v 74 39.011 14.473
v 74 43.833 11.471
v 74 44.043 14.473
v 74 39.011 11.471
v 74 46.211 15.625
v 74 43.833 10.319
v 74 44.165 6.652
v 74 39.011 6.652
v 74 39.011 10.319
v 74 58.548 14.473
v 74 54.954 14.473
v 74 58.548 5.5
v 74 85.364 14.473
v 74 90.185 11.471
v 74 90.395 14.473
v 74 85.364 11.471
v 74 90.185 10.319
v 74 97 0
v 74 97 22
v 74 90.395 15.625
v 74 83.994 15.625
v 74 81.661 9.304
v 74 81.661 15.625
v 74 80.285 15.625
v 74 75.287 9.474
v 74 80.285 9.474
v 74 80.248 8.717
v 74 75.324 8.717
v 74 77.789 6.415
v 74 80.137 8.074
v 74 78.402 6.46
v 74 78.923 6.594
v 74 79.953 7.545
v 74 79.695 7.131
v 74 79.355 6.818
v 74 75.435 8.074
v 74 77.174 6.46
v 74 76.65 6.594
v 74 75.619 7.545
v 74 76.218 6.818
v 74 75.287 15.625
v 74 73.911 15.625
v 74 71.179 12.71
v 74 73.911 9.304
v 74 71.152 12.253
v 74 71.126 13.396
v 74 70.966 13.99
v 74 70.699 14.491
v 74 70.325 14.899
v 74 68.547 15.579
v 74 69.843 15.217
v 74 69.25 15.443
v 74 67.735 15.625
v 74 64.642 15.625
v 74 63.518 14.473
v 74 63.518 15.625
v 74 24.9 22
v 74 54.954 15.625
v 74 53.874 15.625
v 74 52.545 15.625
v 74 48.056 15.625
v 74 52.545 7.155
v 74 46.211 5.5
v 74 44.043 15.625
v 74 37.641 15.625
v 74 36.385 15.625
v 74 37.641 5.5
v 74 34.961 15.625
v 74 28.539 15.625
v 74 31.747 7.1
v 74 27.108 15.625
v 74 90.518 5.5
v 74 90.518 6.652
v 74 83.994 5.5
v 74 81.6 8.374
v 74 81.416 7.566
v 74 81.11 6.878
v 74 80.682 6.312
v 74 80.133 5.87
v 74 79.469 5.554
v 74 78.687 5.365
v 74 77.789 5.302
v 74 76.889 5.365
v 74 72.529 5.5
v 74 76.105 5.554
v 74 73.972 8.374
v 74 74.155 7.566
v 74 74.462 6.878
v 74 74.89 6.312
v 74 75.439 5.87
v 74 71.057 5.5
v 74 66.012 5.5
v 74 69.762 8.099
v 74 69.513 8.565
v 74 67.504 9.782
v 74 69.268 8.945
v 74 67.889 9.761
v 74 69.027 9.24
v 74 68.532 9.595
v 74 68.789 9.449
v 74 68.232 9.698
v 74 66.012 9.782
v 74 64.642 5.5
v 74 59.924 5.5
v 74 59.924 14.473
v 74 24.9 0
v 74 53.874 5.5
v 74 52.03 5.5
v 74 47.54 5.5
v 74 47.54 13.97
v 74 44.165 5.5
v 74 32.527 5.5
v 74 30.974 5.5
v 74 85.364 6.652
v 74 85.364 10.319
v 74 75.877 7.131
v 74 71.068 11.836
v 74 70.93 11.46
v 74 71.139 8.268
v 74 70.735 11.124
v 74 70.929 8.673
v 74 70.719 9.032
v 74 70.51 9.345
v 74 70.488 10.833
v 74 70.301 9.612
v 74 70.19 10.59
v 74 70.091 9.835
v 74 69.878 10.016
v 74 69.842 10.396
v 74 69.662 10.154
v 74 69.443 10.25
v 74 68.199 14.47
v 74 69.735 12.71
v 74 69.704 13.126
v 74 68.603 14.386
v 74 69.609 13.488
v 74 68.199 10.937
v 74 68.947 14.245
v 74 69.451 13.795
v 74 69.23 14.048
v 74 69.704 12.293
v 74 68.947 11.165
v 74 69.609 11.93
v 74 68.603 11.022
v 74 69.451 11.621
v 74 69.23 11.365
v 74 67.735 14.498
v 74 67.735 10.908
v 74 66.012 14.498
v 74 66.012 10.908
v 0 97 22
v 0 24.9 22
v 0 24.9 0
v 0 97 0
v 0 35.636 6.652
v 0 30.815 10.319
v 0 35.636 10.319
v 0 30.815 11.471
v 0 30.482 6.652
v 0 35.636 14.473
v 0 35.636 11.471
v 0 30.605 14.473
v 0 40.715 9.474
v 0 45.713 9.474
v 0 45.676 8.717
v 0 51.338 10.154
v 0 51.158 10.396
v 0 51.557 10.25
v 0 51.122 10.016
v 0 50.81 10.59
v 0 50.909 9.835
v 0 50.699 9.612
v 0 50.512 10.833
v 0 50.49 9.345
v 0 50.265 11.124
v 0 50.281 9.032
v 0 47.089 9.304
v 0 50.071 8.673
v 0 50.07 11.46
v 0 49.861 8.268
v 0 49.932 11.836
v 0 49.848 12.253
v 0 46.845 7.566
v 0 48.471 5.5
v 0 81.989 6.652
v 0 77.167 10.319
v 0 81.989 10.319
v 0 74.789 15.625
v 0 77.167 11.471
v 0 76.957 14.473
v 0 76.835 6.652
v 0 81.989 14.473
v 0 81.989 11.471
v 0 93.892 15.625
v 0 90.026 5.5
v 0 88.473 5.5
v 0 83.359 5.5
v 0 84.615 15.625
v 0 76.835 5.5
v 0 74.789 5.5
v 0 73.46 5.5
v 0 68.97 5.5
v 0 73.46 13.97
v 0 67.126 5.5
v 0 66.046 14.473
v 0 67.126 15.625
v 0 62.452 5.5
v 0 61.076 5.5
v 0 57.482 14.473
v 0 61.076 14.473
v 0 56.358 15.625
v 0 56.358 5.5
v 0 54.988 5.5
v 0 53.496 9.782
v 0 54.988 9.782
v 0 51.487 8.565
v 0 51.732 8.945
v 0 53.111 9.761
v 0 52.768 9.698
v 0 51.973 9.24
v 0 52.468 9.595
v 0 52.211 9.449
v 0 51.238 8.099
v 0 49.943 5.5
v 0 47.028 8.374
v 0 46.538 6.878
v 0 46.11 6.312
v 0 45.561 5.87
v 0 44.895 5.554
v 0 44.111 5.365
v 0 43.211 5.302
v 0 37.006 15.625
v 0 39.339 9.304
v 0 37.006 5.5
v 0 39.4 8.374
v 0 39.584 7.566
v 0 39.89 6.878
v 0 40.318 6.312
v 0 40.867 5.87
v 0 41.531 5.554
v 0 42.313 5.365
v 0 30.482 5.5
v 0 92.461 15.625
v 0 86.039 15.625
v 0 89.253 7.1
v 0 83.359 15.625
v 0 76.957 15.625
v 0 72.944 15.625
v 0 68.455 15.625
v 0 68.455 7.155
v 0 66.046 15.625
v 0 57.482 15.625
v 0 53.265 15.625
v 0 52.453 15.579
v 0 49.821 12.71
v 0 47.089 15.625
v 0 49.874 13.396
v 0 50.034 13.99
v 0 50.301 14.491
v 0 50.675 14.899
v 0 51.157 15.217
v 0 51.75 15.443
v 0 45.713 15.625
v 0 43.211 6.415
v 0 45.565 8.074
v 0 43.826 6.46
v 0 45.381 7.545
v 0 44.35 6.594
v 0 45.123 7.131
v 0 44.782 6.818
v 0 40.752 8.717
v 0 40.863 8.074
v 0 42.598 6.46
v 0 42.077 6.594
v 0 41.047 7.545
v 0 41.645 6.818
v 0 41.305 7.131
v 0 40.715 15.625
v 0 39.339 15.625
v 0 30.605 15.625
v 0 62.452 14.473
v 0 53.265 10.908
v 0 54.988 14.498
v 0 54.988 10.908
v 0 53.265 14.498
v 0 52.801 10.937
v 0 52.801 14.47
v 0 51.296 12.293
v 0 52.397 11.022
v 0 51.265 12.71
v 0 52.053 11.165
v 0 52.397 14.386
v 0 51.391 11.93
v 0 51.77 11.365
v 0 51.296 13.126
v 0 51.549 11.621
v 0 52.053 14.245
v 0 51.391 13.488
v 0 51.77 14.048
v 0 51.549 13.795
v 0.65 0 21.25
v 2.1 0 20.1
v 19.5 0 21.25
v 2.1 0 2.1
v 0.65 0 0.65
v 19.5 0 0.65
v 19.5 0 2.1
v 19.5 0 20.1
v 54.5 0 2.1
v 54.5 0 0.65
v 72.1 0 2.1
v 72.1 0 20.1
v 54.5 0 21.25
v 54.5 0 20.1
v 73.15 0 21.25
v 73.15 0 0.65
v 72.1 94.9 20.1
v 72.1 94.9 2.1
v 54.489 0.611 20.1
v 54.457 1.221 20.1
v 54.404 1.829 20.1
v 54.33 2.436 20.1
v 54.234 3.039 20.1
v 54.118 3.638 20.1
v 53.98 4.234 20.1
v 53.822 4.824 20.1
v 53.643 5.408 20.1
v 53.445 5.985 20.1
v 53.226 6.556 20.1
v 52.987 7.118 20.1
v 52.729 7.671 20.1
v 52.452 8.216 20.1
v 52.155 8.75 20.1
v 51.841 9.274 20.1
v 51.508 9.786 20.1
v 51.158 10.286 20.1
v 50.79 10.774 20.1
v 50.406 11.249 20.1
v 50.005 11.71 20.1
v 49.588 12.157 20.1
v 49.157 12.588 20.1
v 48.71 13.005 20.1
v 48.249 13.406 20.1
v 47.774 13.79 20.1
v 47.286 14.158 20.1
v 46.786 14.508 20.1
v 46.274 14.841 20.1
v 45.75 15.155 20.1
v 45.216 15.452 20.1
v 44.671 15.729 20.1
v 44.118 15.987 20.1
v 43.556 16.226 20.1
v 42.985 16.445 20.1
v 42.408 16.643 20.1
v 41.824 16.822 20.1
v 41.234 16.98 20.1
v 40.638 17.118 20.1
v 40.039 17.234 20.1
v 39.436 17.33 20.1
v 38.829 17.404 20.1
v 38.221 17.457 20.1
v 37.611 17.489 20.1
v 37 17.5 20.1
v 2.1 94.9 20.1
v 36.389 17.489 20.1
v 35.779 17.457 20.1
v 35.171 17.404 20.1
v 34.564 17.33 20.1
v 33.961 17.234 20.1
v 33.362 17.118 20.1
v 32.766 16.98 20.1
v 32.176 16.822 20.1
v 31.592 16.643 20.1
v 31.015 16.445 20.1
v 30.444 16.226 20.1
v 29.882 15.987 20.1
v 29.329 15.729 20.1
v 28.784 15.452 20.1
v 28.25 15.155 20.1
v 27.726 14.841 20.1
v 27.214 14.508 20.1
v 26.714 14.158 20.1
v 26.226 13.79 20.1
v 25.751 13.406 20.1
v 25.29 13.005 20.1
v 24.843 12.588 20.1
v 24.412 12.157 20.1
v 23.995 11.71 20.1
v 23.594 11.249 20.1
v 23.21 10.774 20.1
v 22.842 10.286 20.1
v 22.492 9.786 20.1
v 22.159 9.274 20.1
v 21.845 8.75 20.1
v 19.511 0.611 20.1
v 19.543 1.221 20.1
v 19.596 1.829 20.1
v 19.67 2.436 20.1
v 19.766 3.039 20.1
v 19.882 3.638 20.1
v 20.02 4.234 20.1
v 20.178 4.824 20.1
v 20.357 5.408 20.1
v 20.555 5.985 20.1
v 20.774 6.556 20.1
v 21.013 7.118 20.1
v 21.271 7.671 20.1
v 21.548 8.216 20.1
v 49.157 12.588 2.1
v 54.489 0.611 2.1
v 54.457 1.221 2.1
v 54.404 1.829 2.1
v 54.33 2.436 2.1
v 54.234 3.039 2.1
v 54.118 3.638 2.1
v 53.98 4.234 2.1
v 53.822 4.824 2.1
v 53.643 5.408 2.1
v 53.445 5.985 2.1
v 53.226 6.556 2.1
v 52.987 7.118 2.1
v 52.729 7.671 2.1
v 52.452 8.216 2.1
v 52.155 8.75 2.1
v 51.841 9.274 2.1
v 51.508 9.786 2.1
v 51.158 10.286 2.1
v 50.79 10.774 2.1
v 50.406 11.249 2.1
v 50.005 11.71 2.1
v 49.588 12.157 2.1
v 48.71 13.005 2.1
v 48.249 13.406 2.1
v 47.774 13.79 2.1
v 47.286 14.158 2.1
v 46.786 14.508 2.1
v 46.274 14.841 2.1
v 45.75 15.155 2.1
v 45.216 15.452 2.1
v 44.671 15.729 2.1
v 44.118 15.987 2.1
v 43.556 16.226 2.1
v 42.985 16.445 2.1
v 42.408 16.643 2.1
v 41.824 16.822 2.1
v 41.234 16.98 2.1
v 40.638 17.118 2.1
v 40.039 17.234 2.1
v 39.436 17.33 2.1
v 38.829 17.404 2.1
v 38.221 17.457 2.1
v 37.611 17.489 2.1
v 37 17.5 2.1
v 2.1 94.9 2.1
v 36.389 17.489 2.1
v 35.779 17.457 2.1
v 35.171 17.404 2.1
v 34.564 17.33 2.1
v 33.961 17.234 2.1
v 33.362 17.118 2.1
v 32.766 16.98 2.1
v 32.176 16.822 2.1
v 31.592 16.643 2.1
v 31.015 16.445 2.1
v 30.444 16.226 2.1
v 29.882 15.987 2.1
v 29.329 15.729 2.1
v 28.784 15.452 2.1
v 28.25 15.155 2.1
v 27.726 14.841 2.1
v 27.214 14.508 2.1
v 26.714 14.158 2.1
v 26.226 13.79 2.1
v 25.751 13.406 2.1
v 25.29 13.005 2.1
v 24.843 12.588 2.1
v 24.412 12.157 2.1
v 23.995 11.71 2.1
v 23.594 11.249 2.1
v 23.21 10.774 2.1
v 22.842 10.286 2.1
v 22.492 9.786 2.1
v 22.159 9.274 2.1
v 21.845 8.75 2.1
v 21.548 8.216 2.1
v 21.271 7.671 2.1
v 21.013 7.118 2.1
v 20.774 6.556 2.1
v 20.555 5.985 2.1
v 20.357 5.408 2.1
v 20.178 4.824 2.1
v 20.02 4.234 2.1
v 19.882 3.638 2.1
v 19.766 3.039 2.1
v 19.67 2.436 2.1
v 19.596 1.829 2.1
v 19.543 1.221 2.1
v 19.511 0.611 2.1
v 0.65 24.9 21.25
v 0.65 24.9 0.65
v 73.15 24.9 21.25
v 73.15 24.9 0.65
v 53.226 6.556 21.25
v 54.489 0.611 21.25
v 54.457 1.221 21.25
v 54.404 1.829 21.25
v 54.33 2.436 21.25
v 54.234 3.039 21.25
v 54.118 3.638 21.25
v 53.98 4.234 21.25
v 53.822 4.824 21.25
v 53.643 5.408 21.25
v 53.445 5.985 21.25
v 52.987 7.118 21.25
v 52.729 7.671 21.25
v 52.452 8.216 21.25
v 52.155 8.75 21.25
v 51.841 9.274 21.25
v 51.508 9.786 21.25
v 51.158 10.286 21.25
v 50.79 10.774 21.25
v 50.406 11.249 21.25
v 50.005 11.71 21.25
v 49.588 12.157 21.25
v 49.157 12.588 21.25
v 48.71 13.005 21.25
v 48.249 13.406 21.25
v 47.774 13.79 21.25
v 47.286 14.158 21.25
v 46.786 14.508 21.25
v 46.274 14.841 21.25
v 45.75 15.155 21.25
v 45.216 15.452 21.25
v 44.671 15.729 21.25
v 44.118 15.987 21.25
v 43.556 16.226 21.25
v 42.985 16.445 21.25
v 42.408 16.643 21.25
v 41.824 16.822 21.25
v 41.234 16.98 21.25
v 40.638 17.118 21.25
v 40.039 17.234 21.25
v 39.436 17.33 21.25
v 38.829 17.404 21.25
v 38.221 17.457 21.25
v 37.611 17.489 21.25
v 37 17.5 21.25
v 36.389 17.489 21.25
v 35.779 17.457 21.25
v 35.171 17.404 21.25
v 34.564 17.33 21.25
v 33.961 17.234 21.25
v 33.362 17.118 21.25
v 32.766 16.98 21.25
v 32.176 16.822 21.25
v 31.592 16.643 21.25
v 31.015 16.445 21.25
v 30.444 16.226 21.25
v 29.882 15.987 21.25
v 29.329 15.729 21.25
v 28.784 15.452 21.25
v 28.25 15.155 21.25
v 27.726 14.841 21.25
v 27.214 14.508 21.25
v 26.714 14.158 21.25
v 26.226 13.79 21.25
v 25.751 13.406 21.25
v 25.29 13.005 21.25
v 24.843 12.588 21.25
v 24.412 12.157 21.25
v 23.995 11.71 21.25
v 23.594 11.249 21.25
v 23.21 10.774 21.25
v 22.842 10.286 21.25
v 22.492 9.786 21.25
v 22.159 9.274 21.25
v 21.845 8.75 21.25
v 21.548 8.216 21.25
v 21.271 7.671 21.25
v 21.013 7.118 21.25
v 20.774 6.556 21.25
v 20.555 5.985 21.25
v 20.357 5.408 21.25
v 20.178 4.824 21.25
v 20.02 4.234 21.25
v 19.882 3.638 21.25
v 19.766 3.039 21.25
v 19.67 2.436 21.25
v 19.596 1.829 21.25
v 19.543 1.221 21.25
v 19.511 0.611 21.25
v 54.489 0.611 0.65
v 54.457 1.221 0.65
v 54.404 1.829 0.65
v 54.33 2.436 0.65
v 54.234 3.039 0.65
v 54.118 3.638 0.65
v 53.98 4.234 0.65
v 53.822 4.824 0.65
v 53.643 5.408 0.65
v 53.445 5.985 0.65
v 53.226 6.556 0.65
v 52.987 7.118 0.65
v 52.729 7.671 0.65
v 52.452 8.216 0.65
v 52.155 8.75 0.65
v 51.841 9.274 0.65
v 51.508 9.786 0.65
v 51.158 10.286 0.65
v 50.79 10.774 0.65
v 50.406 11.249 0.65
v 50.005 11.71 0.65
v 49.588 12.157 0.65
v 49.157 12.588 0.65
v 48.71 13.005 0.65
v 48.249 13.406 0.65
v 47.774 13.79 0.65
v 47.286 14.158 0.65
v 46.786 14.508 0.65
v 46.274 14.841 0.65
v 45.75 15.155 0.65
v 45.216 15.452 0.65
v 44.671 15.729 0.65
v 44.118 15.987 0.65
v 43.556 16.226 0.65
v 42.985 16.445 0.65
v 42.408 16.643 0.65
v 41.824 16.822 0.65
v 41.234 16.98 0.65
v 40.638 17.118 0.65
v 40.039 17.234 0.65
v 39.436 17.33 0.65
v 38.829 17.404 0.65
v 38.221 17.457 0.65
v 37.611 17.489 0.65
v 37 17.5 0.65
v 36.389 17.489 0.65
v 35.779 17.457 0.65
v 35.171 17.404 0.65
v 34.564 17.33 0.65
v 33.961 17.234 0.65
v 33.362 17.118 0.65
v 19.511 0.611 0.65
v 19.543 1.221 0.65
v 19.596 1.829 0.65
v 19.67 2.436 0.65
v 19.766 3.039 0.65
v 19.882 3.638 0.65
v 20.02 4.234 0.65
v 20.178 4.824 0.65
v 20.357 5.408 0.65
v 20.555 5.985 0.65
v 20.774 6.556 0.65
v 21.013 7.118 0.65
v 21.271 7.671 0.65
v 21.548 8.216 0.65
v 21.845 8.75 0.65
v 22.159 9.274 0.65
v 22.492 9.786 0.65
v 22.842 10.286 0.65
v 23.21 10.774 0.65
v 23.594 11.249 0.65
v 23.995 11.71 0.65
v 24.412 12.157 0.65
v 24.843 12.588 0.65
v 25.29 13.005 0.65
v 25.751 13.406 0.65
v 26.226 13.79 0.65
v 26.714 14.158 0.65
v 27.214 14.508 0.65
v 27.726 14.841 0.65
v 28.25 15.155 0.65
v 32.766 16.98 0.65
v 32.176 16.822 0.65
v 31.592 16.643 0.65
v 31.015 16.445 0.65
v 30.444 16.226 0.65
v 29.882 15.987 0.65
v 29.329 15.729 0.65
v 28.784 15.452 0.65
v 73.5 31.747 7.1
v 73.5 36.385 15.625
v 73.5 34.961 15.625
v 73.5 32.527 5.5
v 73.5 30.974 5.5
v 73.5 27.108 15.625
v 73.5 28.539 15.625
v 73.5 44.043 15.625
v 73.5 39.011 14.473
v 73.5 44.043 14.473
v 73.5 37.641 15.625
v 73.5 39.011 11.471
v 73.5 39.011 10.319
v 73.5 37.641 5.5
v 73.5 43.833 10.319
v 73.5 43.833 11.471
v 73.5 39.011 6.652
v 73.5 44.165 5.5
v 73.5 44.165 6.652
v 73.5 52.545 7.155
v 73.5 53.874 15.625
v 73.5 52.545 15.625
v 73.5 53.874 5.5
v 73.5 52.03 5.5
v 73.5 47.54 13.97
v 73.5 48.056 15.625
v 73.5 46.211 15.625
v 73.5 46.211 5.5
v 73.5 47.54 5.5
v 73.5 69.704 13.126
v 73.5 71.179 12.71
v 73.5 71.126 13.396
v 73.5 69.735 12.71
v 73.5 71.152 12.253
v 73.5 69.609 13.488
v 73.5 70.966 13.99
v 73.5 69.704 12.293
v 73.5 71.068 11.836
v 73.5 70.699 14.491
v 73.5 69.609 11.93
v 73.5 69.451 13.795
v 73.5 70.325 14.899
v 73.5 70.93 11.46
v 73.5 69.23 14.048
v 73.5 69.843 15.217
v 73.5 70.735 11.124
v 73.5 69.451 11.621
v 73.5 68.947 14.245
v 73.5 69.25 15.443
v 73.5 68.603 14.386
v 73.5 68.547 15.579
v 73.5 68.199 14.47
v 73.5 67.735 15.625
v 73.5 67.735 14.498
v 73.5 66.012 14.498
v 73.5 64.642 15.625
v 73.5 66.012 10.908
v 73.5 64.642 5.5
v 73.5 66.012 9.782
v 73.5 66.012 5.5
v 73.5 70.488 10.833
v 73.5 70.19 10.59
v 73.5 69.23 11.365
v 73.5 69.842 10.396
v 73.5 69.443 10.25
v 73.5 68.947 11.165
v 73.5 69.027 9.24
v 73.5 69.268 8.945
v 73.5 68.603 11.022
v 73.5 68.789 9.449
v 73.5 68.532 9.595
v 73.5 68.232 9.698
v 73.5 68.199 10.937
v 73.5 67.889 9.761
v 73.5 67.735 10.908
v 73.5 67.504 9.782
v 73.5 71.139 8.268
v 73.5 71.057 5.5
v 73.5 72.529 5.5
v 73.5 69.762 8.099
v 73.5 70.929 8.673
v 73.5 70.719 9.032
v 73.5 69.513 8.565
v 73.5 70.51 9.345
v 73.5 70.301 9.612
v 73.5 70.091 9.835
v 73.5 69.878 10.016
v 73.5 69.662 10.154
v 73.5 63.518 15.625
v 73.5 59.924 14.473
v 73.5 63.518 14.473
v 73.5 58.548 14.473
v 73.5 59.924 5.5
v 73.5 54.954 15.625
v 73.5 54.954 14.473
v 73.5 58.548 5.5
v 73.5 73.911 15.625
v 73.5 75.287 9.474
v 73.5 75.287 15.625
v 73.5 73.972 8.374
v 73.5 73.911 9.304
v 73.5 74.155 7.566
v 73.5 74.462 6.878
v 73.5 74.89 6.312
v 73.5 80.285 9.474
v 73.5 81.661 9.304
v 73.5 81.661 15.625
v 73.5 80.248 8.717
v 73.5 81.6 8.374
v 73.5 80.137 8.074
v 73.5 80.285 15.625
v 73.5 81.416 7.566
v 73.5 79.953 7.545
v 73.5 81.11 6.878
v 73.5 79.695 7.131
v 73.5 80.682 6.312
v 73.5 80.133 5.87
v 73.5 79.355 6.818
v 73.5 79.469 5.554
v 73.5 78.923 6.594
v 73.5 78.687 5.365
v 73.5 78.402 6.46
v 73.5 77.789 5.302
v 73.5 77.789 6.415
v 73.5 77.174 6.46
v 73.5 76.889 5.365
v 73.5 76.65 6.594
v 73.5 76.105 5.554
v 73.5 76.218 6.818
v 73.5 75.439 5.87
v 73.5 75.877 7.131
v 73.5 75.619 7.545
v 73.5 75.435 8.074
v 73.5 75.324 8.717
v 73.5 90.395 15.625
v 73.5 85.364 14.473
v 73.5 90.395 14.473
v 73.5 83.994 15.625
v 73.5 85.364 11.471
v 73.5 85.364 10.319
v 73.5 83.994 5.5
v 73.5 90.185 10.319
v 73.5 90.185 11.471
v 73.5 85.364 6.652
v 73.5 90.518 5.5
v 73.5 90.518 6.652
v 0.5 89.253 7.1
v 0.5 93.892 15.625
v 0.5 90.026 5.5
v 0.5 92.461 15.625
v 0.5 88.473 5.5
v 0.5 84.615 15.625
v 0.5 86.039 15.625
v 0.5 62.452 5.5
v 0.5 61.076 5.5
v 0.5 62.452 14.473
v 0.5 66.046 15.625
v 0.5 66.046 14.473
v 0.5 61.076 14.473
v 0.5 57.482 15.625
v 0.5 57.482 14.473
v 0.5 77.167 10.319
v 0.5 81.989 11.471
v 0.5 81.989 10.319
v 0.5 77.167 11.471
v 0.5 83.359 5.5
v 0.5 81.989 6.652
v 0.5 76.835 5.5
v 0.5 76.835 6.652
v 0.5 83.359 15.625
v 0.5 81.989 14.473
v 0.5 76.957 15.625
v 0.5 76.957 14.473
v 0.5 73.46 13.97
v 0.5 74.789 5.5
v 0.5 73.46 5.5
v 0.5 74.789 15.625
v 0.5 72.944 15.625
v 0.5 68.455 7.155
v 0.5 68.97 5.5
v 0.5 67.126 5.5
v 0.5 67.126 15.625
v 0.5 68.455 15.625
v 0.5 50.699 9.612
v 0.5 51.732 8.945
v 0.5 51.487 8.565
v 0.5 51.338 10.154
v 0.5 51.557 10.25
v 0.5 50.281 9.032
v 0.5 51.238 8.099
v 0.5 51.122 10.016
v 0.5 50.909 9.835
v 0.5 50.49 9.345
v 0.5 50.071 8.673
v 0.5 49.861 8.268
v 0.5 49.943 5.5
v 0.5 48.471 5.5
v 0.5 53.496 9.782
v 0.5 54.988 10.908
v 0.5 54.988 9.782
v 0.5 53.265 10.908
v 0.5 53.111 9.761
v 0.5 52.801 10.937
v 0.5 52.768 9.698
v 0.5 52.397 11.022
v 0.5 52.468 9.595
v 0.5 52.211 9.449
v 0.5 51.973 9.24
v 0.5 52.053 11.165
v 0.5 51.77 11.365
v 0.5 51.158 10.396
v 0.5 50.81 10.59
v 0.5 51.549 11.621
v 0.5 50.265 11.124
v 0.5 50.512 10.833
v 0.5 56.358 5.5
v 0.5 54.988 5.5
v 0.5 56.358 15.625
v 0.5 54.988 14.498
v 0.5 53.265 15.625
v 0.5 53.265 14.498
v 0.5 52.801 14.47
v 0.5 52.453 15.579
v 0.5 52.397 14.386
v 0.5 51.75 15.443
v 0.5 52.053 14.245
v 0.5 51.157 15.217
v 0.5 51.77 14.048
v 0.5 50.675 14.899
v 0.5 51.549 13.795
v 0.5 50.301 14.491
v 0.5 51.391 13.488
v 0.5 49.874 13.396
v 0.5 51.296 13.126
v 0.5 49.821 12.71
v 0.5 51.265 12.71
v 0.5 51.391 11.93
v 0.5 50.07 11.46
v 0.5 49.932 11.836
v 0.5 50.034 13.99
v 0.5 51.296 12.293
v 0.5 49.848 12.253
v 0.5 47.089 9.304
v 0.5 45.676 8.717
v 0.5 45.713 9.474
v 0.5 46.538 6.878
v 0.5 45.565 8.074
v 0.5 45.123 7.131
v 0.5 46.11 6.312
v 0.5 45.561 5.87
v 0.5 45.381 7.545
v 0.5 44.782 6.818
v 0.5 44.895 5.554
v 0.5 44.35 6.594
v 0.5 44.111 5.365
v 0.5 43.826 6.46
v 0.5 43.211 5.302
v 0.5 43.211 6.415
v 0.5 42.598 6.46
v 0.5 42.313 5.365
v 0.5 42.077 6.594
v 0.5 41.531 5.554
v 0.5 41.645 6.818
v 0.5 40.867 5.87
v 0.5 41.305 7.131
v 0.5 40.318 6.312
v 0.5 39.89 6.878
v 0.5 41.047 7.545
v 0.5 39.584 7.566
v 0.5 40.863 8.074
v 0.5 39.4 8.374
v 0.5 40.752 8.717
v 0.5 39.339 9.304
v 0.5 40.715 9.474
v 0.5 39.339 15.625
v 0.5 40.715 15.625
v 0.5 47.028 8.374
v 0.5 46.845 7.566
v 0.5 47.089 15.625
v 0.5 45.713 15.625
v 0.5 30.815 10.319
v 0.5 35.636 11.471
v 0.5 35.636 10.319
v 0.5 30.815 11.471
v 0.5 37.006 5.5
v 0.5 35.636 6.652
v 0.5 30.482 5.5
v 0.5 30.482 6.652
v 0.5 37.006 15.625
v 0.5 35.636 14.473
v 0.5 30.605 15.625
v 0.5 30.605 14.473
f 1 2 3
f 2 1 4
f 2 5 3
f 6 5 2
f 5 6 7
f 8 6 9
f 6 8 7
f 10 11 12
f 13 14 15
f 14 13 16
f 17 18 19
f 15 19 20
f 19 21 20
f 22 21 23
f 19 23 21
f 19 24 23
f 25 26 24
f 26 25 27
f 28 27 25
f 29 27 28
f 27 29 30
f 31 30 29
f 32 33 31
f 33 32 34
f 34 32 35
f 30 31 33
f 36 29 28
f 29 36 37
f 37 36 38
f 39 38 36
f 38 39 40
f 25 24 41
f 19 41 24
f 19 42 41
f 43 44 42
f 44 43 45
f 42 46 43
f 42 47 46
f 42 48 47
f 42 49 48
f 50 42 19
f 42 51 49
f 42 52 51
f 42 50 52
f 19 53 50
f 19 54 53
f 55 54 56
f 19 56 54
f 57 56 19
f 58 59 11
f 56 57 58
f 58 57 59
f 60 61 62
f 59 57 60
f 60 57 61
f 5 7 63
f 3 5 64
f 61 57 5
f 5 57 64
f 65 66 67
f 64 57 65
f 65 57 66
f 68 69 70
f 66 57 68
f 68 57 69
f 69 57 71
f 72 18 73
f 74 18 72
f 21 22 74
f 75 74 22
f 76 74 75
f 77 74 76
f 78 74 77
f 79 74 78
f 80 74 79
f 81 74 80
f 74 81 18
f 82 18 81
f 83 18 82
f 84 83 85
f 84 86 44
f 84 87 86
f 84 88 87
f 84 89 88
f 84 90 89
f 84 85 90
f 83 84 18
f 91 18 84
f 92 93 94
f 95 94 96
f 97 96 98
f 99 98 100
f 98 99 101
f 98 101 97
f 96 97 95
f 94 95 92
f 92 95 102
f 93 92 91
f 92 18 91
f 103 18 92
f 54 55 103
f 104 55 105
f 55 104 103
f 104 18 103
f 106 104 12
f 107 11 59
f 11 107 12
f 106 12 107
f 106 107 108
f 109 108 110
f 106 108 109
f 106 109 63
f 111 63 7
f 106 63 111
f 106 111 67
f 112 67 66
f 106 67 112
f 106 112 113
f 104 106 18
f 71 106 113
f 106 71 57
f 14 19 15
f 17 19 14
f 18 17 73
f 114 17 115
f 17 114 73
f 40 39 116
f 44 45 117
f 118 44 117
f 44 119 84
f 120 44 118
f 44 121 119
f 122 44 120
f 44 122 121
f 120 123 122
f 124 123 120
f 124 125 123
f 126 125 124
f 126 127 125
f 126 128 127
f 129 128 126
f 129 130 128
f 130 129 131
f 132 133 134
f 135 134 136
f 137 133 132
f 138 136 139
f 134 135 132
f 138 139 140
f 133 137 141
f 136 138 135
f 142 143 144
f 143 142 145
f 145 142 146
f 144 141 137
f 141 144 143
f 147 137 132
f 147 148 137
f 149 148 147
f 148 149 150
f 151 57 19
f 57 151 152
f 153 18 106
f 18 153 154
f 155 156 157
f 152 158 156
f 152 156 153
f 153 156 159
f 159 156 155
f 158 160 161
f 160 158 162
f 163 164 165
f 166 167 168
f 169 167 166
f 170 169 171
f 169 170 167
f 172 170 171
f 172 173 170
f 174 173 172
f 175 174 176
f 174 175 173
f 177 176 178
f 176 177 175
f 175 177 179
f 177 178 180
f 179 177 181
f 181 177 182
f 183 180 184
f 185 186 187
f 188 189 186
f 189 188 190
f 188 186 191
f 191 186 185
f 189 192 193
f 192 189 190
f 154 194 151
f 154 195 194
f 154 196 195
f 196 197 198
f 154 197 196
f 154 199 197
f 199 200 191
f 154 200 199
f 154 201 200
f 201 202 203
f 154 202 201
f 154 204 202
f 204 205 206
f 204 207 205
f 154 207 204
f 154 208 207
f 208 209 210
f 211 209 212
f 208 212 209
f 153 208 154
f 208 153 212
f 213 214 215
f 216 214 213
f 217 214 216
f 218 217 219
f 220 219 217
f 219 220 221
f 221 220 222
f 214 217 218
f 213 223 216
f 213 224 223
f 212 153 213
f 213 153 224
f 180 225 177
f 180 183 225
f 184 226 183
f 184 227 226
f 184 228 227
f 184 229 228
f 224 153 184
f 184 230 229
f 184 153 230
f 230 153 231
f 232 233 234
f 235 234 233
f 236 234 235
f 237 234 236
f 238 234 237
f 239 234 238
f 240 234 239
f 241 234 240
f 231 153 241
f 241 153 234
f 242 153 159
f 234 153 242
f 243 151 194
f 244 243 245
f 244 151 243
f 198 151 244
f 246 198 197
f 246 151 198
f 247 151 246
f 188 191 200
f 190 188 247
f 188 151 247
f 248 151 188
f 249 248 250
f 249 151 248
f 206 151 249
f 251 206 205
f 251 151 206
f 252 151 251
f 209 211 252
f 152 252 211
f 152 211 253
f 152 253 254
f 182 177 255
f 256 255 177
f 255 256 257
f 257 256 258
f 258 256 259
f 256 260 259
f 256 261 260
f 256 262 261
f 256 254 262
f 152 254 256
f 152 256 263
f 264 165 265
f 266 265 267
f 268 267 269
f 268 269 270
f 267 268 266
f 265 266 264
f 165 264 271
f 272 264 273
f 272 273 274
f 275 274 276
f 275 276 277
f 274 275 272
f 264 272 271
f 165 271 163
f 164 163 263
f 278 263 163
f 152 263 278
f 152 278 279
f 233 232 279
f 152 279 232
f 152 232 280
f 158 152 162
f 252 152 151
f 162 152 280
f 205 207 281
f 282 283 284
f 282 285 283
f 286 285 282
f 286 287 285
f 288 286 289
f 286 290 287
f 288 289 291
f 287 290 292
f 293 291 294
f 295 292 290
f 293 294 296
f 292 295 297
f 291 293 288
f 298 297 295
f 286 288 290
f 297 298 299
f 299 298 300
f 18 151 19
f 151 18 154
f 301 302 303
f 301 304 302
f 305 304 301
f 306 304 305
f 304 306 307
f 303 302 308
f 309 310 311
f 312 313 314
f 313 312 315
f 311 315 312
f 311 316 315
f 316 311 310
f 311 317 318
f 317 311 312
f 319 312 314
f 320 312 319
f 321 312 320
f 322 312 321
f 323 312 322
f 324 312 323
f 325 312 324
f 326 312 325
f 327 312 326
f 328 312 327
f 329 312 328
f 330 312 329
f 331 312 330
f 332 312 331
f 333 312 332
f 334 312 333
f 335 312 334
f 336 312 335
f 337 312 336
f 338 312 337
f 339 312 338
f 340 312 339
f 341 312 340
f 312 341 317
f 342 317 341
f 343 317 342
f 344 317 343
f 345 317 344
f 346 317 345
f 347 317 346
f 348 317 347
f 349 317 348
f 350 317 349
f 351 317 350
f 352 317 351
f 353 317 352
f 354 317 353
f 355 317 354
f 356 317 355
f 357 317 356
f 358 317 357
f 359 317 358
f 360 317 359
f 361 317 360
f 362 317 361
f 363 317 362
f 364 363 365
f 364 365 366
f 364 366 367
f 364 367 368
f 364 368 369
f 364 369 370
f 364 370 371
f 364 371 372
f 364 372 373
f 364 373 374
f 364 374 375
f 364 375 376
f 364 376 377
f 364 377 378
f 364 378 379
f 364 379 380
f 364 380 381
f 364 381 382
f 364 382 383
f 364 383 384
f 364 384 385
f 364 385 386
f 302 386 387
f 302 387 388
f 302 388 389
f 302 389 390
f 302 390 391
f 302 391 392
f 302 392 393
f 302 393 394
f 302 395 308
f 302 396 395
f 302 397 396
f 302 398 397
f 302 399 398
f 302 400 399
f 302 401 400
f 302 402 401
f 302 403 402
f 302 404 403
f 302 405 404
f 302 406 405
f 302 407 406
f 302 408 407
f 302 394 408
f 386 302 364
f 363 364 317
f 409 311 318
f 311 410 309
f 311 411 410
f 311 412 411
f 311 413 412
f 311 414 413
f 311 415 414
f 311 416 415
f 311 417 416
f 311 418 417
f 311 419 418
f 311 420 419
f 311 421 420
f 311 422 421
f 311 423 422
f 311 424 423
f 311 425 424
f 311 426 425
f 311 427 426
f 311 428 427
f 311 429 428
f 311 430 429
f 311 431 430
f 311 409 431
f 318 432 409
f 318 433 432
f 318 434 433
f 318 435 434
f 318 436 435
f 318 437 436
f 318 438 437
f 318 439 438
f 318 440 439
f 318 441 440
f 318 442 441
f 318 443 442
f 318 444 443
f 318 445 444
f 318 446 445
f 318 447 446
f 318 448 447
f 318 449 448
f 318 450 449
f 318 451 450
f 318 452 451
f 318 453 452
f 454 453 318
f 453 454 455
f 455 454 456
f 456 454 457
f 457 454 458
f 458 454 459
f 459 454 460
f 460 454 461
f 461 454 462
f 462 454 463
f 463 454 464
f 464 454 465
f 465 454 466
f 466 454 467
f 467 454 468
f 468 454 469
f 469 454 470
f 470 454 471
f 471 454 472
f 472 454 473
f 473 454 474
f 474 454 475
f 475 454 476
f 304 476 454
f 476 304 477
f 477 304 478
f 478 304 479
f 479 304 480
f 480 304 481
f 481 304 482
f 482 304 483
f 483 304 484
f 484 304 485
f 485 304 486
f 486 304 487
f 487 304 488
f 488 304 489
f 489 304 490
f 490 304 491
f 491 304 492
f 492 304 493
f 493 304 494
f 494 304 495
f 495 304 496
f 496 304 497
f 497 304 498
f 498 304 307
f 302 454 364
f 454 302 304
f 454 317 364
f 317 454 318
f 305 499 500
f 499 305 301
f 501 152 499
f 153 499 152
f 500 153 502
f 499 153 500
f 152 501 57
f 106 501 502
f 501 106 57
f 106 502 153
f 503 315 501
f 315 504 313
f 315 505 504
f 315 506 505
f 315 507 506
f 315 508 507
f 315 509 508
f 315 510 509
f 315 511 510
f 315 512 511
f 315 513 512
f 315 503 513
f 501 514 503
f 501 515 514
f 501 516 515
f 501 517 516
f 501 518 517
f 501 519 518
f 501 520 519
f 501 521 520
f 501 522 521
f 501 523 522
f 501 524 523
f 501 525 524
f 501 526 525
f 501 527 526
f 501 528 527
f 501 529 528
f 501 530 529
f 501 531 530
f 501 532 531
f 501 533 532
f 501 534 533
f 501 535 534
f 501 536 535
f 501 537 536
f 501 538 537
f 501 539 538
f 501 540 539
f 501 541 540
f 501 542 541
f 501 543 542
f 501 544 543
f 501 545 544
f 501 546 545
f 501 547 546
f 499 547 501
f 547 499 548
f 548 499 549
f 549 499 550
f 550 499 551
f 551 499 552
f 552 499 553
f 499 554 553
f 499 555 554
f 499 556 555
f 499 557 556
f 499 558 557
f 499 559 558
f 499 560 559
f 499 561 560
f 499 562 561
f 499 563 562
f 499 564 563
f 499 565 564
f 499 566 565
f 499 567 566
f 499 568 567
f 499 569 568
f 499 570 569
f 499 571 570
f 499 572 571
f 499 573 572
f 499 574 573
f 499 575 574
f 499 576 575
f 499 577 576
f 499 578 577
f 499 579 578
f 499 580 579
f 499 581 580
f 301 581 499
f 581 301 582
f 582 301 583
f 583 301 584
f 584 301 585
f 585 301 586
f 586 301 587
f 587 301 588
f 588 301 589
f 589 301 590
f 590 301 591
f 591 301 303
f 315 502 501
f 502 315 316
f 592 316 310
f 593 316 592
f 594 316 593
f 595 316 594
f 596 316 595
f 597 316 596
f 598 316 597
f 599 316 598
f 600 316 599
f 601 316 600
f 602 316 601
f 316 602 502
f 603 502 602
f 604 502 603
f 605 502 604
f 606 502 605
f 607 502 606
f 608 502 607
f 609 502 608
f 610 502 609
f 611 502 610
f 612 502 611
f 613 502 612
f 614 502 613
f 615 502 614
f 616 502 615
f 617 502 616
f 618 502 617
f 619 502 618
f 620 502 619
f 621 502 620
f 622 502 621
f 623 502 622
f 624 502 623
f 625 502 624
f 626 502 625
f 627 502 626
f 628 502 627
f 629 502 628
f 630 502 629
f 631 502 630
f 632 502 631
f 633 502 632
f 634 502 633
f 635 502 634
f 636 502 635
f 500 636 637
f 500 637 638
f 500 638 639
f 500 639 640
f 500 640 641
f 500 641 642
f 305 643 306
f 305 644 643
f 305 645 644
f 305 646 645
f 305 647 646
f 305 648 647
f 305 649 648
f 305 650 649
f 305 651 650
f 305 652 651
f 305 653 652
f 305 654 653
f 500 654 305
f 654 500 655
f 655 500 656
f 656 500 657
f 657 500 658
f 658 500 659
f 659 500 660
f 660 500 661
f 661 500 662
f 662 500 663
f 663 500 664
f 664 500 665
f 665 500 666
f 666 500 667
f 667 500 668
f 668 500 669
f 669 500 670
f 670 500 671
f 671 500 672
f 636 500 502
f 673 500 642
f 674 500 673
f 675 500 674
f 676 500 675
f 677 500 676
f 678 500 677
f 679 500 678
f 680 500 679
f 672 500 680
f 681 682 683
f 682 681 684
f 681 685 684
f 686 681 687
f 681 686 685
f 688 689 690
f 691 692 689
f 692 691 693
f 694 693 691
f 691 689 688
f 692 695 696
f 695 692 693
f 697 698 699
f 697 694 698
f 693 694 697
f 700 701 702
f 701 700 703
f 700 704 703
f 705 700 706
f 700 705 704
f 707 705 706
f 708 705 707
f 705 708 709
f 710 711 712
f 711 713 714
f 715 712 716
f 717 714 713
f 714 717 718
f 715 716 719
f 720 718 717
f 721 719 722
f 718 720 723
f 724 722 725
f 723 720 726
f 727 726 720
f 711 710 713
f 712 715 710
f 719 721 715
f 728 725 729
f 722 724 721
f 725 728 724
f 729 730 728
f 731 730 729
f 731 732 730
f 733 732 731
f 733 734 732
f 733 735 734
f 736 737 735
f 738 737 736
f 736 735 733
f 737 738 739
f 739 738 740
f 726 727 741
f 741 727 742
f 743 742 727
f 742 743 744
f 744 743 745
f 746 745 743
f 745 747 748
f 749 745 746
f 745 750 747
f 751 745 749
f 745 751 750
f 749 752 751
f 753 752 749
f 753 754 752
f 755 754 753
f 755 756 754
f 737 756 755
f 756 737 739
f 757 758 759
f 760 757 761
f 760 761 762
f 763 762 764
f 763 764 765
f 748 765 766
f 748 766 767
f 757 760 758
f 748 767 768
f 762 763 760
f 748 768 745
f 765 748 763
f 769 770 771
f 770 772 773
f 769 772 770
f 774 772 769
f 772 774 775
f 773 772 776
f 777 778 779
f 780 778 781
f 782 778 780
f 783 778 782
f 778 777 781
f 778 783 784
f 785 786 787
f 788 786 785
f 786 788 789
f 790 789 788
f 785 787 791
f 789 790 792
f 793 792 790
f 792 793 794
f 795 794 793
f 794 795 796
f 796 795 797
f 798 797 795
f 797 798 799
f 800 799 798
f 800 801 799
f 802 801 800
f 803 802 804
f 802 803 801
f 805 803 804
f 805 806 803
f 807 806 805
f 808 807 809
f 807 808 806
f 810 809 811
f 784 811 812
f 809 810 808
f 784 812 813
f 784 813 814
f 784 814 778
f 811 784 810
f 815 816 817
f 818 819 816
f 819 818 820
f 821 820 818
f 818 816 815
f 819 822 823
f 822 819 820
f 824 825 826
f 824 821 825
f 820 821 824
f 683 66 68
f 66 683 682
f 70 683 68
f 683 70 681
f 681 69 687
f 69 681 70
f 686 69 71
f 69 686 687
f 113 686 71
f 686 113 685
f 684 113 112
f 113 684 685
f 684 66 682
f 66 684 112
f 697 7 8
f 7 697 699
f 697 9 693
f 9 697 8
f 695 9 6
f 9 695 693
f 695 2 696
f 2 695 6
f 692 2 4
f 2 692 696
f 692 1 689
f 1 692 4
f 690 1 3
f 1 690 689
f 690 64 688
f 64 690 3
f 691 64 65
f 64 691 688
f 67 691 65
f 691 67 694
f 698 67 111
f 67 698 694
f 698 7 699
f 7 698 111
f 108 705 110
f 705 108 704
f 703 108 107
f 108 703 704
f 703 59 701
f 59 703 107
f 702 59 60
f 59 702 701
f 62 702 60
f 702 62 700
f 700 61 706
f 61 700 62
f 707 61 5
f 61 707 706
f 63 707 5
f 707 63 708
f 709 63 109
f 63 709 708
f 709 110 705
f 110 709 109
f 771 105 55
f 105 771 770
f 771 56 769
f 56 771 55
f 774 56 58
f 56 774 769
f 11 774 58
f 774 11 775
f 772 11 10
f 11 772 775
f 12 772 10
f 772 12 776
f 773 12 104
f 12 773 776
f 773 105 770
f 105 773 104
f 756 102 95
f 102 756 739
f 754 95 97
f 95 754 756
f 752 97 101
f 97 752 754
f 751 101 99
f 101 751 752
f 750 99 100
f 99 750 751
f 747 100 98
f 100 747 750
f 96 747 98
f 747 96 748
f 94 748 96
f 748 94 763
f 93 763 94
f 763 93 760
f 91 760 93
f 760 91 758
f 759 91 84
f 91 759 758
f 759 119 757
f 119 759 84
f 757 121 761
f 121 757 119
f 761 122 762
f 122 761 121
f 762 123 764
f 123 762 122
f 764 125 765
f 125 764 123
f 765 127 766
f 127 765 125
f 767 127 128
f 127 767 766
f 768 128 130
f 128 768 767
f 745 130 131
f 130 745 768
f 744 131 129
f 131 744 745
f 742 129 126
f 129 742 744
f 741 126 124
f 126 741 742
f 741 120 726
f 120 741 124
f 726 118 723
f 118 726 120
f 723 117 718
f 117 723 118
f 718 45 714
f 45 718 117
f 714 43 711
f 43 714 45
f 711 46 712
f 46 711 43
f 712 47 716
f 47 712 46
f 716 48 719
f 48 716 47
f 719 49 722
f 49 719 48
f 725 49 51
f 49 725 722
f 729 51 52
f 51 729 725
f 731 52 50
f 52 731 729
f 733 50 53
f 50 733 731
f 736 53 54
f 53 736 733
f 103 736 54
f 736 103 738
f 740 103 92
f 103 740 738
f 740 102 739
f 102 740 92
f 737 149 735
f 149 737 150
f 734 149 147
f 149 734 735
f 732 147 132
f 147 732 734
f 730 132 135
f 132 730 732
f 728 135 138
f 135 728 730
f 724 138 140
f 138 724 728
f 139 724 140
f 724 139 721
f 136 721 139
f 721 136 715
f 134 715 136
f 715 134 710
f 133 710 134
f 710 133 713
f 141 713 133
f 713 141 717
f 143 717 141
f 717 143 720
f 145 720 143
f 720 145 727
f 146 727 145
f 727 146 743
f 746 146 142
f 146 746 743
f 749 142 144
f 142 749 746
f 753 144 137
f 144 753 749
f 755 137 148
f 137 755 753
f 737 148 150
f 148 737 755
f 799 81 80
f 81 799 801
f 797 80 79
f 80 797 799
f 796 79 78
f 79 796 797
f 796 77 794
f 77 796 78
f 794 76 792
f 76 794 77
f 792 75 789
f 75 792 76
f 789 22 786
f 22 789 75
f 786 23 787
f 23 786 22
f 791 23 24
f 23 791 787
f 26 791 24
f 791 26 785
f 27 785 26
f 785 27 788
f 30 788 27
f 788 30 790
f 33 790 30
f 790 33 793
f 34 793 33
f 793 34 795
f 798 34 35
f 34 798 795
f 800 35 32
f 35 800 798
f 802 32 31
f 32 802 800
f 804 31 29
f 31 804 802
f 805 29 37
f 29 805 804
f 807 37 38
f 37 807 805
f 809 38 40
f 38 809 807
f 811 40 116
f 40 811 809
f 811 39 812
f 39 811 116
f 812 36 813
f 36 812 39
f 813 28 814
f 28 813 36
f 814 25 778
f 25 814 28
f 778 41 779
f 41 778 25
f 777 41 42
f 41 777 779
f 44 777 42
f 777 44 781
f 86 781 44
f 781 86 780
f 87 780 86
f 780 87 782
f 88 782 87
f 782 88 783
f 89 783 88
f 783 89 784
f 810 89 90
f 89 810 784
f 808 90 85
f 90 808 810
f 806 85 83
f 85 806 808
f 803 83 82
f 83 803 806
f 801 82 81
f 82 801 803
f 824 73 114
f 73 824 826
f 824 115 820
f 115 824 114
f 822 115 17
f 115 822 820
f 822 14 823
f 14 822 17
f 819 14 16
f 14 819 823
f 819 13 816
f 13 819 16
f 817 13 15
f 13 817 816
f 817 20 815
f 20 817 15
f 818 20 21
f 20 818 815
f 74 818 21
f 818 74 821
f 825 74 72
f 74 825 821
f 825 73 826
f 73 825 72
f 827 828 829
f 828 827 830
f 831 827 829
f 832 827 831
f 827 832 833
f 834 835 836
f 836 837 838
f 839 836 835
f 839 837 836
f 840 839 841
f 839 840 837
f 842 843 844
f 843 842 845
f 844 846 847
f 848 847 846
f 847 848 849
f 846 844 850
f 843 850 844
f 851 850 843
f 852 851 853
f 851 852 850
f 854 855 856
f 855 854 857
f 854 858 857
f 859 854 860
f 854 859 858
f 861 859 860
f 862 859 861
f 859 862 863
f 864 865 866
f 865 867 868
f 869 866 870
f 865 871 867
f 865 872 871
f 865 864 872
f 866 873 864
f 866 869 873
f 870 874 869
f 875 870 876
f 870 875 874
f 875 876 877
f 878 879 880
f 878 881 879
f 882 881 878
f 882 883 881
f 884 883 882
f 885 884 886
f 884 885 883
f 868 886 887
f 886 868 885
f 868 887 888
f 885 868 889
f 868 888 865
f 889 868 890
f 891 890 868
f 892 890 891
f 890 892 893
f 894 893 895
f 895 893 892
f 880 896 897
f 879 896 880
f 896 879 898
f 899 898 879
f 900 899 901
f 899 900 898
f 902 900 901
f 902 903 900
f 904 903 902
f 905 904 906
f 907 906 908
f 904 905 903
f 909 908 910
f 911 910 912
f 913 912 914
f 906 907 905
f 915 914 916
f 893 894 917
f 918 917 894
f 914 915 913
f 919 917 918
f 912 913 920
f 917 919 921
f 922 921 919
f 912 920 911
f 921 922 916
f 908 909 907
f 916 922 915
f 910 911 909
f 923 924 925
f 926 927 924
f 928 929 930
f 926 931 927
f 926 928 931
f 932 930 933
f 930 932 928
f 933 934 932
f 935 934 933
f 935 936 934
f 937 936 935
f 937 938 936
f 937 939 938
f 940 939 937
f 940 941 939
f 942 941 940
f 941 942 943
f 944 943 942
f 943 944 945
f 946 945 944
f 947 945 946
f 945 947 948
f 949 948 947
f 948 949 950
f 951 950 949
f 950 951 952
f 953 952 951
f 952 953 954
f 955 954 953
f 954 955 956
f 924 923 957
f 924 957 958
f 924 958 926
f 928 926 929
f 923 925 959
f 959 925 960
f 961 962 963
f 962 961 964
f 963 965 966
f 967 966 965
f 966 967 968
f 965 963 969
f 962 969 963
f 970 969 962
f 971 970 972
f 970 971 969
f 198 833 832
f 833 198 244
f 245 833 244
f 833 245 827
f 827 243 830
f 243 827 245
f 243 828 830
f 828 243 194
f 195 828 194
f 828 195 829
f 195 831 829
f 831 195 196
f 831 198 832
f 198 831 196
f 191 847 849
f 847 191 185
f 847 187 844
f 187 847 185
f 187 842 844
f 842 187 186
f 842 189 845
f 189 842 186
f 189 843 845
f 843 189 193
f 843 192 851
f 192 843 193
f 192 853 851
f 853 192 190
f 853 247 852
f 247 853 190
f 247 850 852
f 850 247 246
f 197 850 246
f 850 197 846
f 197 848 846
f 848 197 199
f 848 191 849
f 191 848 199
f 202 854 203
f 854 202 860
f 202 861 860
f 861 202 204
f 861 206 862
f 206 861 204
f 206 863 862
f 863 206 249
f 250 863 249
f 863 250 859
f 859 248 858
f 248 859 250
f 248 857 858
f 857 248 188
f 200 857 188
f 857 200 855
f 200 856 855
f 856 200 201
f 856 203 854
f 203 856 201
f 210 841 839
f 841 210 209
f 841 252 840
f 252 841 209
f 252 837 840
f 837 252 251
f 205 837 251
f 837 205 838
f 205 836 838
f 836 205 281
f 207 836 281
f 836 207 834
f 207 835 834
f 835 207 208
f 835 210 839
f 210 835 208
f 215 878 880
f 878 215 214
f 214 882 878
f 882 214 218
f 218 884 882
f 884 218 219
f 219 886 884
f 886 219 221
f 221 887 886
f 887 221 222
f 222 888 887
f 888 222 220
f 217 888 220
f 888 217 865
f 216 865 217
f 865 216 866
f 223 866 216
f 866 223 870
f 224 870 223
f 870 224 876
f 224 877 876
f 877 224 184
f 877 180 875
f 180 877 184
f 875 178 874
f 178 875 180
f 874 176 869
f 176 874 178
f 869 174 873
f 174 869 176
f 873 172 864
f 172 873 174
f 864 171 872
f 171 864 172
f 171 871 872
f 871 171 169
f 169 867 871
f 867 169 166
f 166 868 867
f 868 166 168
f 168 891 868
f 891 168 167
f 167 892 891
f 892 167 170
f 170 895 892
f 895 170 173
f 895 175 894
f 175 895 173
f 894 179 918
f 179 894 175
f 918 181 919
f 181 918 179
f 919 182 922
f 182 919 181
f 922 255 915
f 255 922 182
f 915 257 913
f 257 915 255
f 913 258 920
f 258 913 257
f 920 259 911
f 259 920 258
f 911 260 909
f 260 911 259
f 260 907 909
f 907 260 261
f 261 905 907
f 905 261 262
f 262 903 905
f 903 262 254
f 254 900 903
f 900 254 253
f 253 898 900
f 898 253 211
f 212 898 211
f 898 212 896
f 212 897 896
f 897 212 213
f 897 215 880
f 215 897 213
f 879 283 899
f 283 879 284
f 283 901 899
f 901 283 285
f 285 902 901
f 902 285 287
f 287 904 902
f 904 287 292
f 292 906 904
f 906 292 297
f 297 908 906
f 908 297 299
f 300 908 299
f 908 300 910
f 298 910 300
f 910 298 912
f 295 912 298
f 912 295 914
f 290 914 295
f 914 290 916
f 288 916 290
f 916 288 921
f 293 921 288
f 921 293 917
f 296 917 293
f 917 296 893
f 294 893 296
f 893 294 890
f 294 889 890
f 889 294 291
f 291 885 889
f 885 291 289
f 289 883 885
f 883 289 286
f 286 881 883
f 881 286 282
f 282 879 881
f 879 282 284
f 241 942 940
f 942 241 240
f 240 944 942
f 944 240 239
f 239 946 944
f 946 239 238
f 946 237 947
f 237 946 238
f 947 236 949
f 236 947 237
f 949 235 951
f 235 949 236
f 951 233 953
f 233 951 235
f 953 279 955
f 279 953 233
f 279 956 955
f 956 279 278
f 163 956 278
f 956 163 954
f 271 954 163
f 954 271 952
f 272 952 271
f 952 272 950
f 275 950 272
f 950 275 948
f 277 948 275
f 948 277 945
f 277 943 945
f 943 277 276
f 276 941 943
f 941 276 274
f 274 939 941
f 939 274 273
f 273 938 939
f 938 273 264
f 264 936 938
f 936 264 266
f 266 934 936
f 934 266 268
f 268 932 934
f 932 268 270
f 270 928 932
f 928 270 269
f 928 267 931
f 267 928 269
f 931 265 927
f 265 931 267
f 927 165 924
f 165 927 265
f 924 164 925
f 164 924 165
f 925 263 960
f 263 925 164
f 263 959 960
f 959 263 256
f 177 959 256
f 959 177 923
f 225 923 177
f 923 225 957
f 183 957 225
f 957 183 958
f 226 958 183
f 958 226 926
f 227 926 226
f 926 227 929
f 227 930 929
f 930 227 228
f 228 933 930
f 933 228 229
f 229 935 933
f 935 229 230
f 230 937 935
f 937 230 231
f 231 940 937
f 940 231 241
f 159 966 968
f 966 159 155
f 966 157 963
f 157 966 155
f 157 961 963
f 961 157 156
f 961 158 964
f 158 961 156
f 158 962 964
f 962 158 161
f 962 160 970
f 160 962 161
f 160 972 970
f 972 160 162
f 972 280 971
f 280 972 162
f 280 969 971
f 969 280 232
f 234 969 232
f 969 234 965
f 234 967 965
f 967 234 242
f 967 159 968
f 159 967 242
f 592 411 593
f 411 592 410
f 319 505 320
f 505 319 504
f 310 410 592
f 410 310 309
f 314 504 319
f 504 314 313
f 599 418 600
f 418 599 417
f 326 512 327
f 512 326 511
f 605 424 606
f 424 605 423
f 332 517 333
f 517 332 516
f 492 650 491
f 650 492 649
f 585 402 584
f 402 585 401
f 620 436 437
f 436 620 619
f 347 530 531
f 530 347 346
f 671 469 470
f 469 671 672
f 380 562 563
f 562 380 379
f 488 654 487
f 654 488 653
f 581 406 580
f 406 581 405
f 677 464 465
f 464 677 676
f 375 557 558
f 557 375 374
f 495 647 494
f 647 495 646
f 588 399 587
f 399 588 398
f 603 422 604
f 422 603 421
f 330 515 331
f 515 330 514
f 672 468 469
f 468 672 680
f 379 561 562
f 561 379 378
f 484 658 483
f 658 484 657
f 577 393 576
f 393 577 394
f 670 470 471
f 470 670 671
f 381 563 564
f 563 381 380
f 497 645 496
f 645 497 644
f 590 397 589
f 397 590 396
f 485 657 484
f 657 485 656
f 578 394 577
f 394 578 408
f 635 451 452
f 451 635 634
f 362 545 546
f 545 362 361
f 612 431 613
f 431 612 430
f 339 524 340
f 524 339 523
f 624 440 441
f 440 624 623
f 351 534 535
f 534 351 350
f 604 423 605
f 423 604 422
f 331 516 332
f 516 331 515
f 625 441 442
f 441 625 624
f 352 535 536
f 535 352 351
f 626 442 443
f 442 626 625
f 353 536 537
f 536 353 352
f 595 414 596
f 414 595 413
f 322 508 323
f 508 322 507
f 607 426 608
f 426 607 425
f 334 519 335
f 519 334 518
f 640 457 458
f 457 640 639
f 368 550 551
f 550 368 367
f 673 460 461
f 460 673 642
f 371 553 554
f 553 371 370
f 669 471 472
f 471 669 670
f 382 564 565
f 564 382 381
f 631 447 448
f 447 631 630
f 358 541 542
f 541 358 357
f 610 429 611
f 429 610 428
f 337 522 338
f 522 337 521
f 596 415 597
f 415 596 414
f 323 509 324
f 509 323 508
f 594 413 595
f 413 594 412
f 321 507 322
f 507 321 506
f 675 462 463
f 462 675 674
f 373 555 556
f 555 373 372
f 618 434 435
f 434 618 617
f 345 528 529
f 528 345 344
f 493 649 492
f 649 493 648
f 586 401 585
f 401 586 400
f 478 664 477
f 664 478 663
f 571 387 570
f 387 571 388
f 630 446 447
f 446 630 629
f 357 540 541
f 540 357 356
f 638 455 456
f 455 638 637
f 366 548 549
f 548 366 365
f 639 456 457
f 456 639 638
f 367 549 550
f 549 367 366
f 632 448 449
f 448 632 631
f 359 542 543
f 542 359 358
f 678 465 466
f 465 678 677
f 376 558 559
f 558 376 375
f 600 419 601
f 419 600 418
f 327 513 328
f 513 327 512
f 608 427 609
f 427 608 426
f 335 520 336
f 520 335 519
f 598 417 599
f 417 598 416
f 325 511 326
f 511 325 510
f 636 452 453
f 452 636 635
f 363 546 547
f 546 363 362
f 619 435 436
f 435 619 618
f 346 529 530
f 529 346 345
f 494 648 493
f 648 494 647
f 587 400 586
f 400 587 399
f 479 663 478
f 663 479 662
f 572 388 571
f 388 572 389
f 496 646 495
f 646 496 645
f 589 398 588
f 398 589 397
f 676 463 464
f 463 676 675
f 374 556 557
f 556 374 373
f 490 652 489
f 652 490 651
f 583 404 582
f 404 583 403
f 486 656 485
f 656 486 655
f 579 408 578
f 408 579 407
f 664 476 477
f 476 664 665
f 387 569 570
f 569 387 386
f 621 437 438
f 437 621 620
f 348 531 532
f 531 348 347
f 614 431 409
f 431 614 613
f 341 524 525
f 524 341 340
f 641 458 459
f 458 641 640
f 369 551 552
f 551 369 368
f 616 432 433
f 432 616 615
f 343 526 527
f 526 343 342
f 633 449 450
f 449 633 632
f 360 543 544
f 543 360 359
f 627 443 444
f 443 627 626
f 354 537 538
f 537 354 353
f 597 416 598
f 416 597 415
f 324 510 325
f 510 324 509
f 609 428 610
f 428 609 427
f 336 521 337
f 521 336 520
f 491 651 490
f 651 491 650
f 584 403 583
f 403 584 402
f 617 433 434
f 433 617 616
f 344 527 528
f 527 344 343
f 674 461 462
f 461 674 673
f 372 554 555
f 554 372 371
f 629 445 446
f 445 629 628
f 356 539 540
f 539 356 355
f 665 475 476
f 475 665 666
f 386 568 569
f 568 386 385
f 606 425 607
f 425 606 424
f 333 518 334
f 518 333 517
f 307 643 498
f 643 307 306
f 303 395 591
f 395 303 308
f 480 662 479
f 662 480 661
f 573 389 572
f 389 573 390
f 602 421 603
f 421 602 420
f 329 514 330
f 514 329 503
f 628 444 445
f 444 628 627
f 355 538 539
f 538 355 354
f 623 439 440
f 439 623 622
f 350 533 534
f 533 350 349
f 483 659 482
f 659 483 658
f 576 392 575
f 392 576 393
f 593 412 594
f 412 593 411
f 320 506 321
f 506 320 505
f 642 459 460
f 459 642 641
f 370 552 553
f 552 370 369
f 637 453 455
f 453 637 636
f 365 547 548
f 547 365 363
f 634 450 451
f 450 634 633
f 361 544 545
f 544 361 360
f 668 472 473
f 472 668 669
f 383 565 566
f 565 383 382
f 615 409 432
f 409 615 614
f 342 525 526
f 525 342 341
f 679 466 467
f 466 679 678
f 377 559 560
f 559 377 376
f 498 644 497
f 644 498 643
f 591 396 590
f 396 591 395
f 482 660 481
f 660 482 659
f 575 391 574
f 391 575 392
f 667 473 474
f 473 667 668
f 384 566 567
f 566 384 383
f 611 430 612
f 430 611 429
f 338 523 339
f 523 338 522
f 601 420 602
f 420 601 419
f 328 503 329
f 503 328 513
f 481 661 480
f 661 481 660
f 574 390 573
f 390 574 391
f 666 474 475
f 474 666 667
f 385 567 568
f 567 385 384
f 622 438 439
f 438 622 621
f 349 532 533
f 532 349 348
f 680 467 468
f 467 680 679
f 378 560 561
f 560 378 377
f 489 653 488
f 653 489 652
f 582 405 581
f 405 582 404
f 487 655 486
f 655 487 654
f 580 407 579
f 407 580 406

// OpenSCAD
// file: parameters.scad
//parameters
//thickness of box sides
wall = 2;

//width of cards, including sleeves and extra space
crdX = 70;

//length of cards including sleeves and extra space
crdY = 93;                  

//height of the entire pile of cards.  modify if you have more cards
crdZ = 18;

//how much of the main box is tapered to accommodate the lid
lidY = 25;

//the size of the taper
lidDiff = 0.75;

//The amount of "looseness" between the lid and the box on each side
lidSpacing = 0.25;

sideFontName="Impact";
sideFontSize=10;
sideFontLeftPadding=2;

//constant to avoid coincident faces.  don't change this
_min=0.1;

//calculated values
trayX = crdX+(2*wall);
trayY = crdY+(2*wall);
trayZ = crdZ+(2*wall);
// main file
include <parameters.scad>

difference() {
    cube([trayX,trayY,trayZ]);
    
    translate([wall+_min,0-_min,wall+_min]) cube([trayX-(wall*2),trayY-(wall),trayZ-(wall*2)]);
    
    //lid taper
    translate([0-_min,0-_min,0]) cube([lidDiff,lidY,trayZ+_min]);
    translate([0-_min,0-_min,trayZ-lidDiff]) cube([trayX+_min,lidY,trayZ-lidDiff]);
    translate([trayX-lidDiff-_min,0-_min,0]) cube([lidDiff+(2*_min),lidY,trayZ+_min]);
    translate([0-_min,0-_min,0-_min]) cube([trayX+_min,lidY,lidDiff]);

    // side text 1
    translate([trayX-.5,lidY+2,(trayZ/2)-(sideFontSize/2)-.5])
    rotate([90,0,90])
    linear_extrude(2)
    text("VENTRUE", font=sideFontName, size=sideFontSize);

    //side text 2
    translate([0.5,trayY-3,(trayZ/2)-(sideFontSize/2)-.5])
    rotate([90,0,270])
    linear_extrude(2)
    text("VENTRUE", font=sideFontName, size=sideFontSize);
    
    //finger notch
    translate([wall+(crdX/2),0,0])
    cylinder(h=crdZ+(2*wall),r1=crdX/4, r2=crdX/4,$fn=180);
}
    
